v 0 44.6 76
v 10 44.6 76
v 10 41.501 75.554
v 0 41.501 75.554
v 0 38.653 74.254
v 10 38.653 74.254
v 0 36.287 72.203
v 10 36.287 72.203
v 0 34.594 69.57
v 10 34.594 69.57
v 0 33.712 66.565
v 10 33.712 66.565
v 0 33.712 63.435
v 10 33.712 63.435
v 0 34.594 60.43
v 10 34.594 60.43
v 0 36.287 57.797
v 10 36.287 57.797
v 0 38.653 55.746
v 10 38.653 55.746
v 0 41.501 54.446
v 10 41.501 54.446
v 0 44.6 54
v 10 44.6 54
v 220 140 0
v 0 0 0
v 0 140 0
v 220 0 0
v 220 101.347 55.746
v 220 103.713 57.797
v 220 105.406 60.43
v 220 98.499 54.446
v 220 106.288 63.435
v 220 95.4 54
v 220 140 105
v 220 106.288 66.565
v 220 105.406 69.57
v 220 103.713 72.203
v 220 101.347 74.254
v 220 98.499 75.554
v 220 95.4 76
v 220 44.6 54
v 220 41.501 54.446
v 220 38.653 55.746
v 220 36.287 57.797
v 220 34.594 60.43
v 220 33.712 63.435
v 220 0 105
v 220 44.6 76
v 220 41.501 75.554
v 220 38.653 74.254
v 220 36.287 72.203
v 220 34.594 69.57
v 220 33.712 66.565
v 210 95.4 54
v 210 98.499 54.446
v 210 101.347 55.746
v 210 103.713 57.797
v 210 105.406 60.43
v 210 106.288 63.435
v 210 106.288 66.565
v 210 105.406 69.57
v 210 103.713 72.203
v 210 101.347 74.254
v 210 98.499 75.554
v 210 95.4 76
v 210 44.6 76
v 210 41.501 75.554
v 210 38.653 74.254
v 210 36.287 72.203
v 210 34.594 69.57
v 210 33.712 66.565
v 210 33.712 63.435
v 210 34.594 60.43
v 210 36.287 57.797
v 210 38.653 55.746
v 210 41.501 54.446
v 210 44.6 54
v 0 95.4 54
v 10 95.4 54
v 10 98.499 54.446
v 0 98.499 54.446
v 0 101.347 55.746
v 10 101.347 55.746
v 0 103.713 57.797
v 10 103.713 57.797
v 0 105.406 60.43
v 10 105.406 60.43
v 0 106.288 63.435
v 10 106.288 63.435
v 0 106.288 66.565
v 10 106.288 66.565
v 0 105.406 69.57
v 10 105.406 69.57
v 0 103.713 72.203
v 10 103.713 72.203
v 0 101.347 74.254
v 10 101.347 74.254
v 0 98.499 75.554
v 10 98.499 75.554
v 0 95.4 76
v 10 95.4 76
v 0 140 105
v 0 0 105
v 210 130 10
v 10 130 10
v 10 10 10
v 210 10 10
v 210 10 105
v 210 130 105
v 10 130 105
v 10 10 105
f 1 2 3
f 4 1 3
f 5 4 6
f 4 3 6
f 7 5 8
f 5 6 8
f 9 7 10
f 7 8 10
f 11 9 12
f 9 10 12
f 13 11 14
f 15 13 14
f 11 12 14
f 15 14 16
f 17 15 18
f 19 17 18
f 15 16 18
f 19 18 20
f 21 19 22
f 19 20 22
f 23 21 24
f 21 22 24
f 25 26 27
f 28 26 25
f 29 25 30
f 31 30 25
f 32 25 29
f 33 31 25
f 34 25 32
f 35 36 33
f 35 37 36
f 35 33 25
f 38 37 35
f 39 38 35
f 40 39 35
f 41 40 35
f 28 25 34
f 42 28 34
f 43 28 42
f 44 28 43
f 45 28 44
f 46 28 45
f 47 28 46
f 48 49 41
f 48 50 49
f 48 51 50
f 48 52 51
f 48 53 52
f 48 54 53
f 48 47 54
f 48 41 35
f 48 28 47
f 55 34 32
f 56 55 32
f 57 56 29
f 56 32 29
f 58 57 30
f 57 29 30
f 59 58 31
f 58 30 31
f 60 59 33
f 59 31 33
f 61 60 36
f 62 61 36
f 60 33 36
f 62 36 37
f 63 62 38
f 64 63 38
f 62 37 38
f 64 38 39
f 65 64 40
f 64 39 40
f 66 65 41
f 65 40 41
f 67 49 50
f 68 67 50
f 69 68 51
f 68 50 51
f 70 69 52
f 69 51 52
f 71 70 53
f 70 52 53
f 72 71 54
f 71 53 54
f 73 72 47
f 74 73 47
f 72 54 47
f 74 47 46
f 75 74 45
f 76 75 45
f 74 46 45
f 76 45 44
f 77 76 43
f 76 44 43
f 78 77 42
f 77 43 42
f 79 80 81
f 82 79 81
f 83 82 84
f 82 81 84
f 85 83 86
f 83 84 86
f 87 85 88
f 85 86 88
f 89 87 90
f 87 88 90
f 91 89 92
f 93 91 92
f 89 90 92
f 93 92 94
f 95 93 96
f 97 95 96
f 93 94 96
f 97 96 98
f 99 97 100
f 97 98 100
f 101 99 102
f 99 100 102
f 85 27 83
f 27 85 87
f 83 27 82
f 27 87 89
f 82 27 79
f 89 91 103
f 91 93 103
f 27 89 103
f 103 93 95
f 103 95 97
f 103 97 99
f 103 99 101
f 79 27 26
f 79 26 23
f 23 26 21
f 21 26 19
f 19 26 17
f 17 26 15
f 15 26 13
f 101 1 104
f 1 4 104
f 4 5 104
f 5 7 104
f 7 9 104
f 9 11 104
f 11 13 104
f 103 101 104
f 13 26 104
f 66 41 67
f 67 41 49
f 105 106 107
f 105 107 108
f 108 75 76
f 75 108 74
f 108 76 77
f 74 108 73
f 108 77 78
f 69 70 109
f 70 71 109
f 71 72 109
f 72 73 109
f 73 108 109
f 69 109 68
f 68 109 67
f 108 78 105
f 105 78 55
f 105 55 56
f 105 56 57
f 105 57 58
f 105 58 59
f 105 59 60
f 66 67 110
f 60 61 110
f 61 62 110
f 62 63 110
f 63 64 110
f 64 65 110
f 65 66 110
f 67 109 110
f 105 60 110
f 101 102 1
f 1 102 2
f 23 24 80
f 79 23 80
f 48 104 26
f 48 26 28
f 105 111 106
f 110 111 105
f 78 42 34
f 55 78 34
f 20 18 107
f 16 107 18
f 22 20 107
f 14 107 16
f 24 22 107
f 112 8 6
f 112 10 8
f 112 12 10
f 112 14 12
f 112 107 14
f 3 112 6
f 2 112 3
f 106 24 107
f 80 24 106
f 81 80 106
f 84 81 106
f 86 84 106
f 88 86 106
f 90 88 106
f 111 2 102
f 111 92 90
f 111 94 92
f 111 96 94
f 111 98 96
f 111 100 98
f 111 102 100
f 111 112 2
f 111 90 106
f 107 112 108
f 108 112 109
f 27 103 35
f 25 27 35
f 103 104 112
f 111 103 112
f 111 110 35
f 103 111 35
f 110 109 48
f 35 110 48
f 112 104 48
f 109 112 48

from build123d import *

# Parameters (mm, degrees)
F0_W     = 220
F0_H     = 105
F1_DEPTH = 140
F2_W     = 200
F2_H     = 120
F3_DEPTH = 95
F5_DEPTH = 220.001


with BuildPart() as f1:
    # F0 (on Front) → F1 (new body)
    with BuildSketch(Plane.XZ):
        with Locations((110, 52.5)):
            Rectangle(F0_W, F0_H)
    extrude(amount=-F1_DEPTH)

    # F2 (on face) → F3 (cut)
    with BuildSketch(Plane.XY.offset(105)):
        with Locations((110, 70)):
            Rectangle(F2_W, F2_H)
    extrude(amount=-F3_DEPTH, mode=Mode.SUBTRACT)

    # F4 (on face) → F5 (cut, through all)
    with BuildSketch(Plane.YZ.offset(220)):
        with BuildLine():
            Line((95.4, 76), (44.6, 76))
            ThreePointArc((44.6, 76), (33.6, 65), (44.6, 54))
            Line((44.6, 54), (95.4, 54))
            ThreePointArc((95.4, 54), (106.4, 65), (95.4, 76))
        make_face()
    extrude(amount=-F5_DEPTH, mode=Mode.SUBTRACT)


solid = f1.part
